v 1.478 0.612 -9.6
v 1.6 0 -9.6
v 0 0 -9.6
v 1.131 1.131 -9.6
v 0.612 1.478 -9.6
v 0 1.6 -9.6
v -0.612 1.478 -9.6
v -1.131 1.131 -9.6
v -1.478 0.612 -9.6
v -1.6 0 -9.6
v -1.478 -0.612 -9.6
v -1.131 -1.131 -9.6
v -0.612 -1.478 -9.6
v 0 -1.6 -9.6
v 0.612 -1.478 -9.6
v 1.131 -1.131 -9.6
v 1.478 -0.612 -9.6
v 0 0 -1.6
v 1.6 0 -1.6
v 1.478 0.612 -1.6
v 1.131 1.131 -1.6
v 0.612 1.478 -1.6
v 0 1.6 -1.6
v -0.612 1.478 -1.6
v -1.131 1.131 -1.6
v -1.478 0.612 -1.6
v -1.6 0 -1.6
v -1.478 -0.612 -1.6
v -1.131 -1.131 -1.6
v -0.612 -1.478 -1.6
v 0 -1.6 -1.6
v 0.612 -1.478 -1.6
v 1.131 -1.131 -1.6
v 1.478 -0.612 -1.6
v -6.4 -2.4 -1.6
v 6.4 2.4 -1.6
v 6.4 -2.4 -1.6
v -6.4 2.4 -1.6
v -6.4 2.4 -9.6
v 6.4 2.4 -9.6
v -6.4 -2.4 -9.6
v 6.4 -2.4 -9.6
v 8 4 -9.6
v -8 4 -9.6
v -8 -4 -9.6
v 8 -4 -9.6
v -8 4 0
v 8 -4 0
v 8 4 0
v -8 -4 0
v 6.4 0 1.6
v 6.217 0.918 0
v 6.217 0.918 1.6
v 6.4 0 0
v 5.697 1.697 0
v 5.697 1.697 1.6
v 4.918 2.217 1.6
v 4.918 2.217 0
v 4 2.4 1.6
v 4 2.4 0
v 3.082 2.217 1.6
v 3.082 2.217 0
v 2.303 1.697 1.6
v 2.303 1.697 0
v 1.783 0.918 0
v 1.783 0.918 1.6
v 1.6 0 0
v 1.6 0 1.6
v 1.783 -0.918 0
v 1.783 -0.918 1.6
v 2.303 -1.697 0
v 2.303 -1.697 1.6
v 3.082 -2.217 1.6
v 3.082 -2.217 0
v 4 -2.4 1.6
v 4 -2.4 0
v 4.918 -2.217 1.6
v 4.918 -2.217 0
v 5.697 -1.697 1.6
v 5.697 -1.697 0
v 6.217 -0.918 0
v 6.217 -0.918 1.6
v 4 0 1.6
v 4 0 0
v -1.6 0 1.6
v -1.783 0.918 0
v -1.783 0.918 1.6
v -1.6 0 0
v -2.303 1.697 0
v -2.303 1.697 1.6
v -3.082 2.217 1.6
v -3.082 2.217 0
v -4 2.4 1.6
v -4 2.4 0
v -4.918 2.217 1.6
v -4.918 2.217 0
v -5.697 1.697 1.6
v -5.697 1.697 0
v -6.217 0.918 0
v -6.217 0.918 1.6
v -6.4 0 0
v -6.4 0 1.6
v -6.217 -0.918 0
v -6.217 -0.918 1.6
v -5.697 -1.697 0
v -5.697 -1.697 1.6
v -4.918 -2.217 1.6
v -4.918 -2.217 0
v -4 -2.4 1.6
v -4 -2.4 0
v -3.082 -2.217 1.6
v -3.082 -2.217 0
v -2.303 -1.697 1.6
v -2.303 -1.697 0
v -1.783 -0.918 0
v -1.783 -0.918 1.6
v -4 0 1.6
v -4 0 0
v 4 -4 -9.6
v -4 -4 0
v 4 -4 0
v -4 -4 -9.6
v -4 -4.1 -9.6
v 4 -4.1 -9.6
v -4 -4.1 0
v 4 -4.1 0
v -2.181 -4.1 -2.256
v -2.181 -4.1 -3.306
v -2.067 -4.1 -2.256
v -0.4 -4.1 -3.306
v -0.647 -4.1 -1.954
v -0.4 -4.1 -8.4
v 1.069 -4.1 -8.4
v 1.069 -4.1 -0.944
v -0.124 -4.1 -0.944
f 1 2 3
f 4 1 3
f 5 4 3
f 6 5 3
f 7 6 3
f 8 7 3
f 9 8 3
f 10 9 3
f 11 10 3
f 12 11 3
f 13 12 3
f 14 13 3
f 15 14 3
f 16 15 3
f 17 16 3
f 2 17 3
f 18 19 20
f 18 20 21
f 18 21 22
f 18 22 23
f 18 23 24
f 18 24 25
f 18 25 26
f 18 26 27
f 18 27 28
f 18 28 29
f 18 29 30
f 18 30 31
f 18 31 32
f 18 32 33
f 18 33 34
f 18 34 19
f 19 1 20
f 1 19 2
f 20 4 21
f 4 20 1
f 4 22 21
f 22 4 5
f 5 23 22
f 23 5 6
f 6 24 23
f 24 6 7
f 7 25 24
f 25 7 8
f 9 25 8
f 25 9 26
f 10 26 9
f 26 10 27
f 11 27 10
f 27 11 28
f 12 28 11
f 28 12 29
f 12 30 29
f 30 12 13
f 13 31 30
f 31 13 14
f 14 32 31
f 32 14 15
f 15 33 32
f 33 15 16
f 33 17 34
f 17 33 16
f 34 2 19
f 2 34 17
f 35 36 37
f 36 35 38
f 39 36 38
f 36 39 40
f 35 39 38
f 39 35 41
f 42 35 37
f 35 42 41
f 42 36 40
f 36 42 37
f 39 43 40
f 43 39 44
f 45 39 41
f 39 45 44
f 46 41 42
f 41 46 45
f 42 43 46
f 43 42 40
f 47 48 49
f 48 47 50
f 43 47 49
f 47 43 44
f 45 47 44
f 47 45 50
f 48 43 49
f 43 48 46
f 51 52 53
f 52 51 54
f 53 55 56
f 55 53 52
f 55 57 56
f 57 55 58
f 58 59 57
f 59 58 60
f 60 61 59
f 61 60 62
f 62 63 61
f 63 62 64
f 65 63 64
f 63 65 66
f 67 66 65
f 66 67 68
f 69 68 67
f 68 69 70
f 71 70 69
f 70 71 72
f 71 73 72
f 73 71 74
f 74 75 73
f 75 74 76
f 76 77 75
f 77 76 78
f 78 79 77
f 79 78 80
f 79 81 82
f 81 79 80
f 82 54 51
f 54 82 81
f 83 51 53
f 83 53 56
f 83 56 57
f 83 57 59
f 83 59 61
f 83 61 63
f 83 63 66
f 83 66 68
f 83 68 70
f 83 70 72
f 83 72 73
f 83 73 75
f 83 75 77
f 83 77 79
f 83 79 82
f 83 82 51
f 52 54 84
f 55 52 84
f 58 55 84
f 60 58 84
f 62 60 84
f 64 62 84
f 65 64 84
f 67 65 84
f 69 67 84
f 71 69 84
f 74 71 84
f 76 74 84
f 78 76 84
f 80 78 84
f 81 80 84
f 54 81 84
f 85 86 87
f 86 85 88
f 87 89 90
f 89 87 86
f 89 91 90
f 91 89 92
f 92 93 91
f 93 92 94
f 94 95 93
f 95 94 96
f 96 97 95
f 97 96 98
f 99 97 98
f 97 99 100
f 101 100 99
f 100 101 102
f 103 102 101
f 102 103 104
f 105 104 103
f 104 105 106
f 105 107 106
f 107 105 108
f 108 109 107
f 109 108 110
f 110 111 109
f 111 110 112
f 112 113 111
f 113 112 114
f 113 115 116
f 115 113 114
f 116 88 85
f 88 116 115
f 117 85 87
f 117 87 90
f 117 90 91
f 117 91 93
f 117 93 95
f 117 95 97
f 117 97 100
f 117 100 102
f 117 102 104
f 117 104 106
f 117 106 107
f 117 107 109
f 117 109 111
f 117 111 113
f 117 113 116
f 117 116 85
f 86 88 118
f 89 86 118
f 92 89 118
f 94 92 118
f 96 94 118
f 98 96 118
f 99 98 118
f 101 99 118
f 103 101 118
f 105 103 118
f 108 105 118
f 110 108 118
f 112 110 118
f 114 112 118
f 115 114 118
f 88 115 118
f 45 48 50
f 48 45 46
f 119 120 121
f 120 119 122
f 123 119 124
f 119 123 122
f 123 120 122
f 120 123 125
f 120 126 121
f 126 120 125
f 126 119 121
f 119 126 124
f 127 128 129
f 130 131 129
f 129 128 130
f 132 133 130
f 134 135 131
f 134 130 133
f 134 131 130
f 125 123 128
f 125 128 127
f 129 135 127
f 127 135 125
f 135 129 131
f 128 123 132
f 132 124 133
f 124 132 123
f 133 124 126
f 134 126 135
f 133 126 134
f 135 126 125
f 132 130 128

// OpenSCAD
// file: ../p/4-4edge.scad
use <../lib.scad>
function ldraw_lib__4_4edge() = [
// 0 Circle 1.0
// 0 Name: 4-4edge.dat
// 0 Author: James Jessiman
// 0 !LDRAW_ORG Primitive UPDATE 2017-01
// 0 !LICENSE Licensed under CC BY 2.0 and CC BY 4.0 : see CAreadme.txt
// 
// 0 BFC CERTIFY CCW
  [0,"BFC","CERTIFY"],
  [0,"BFC","CCW"],
// 
// 0 !HISTORY 1998-12-15 [PTadmin] Official Update 1998-10
// 0 !HISTORY 2005-12-28 [PTadmin] Official Update 2005-01
// 0 !HISTORY 2007-06-24 [PTadmin] Header formatted for Contributor Agreement
// 0 !HISTORY 2008-07-01 [PTadmin] Official Update 2008-01
// 0 !HISTORY 2017-01-15 [Steffen] BFCed
// 0 !HISTORY 2017-12-30 [PTadmin] Official Update 2017-01
// 
// 
// 2 24 1 0 0 0.9239 0 0.3827
  [2,24,1,0,0,0.9239,0,0.3827],
// 2 24 0.9239 0 0.3827 0.7071 0 0.7071
  [2,24,0.9239,0,0.3827,0.7071,0,0.7071],
// 2 24 0.7071 0 0.7071 0.3827 0 0.9239
  [2,24,0.7071,0,0.7071,0.3827,0,0.9239],
// 2 24 0.3827 0 0.9239 0 0 1
  [2,24,0.3827,0,0.9239,0,0,1],
// 2 24 0 0 1 -0.3827 0 0.9239
  [2,24,0,0,1,-0.3827,0,0.9239],
// 2 24 -0.3827 0 0.9239 -0.7071 0 0.7071
  [2,24,-0.3827,0,0.9239,-0.7071,0,0.7071],
// 2 24 -0.7071 0 0.7071 -0.9239 0 0.3827
  [2,24,-0.7071,0,0.7071,-0.9239,0,0.3827],
// 2 24 -0.9239 0 0.3827 -1 0 -0
  [2,24,-0.9239,0,0.3827,-1,0,-0],
// 2 24 -1 0 -0 -0.9239 0 -0.3827
  [2,24,-1,0,-0,-0.9239,0,-0.3827],
// 2 24 -0.9239 0 -0.3827 -0.7071 0 -0.7071
  [2,24,-0.9239,0,-0.3827,-0.7071,0,-0.7071],
// 2 24 -0.7071 0 -0.7071 -0.3827 0 -0.9239
  [2,24,-0.7071,0,-0.7071,-0.3827,0,-0.9239],
// 2 24 -0.3827 0 -0.9239 0 0 -1
  [2,24,-0.3827,0,-0.9239,0,0,-1],
// 2 24 0 0 -1 0.3827 0 -0.9239
  [2,24,0,0,-1,0.3827,0,-0.9239],
// 2 24 0.3827 0 -0.9239 0.7071 0 -0.7071
  [2,24,0.3827,0,-0.9239,0.7071,0,-0.7071],
// 2 24 0.7071 0 -0.7071 0.9239 0 -0.3827
  [2,24,0.7071,0,-0.7071,0.9239,0,-0.3827],
// 2 24 0.9239 0 -0.3827 1 0 0
  [2,24,0.9239,0,-0.3827,1,0,0],
];
module ldraw_lib__4_4edge(step=0, col=false, unit=2/5, alt=false, line=0.2, solid=!$preview)
    makepoly(ldraw_lib__4_4edge(), step=step, col=col, unit=unit, alt=alt, line=line, solid=solid);
ldraw_lib__4_4edge(line=0.2);
// file: ../p/4-4disc.scad
use <../lib.scad>
function ldraw_lib__4_4disc() = [
// 0 Disc 1.0
// 0 Name: 4-4disc.dat
// 0 Author: James Jessiman
// 0 !LDRAW_ORG Primitive UPDATE 2002-02
// 0 !LICENSE Licensed under CC BY 2.0 and CC BY 4.0 : see CAreadme.txt
// 
// 0 BFC CERTIFY CCW
  [0,"BFC","CERTIFY"],
  [0,"BFC","CCW"],
// 
// 0 !HISTORY 1998-12-15 [PTadmin] Official Update 1998-10
// 0 !HISTORY 2002-03-23 [sbliss] Added BFC statement
// 0 !HISTORY 2002-04-25 [PTadmin] Official Update 2002-02
// 0 !HISTORY 2007-06-24 [PTadmin] Header formatted for Contributor Agreement
// 0 !HISTORY 2008-07-01 [PTadmin] Official Update 2008-01
// 
// 
// 3 16 0 0 0 1 0 0 0.9239 0 0.3827
  [3,16,0,0,0,1,0,0,0.9239,0,0.3827],
// 3 16 0 0 0 0.9239 0 0.3827 0.7071 0 0.7071
  [3,16,0,0,0,0.9239,0,0.3827,0.7071,0,0.7071],
// 3 16 0 0 0 0.7071 0 0.7071 0.3827 0 0.9239
  [3,16,0,0,0,0.7071,0,0.7071,0.3827,0,0.9239],
// 3 16 0 0 0 0.3827 0 0.9239 0 0 1
  [3,16,0,0,0,0.3827,0,0.9239,0,0,1],
// 3 16 0 0 0 0 0 1 -0.3827 0 0.9239
  [3,16,0,0,0,0,0,1,-0.3827,0,0.9239],
// 3 16 0 0 0 -0.3827 0 0.9239 -0.7071 0 0.7071
  [3,16,0,0,0,-0.3827,0,0.9239,-0.7071,0,0.7071],
// 3 16 0 0 0 -0.7071 0 0.7071 -0.9239 0 0.3827
  [3,16,0,0,0,-0.7071,0,0.7071,-0.9239,0,0.3827],
// 3 16 0 0 0 -0.9239 0 0.3827 -1 0 -0
  [3,16,0,0,0,-0.9239,0,0.3827,-1,0,-0],
// 3 16 0 0 0 -1 0 -0 -0.9239 0 -0.3827
  [3,16,0,0,0,-1,0,-0,-0.9239,0,-0.3827],
// 3 16 0 0 0 -0.9239 0 -0.3827 -0.7071 0 -0.7071
  [3,16,0,0,0,-0.9239,0,-0.3827,-0.7071,0,-0.7071],
// 3 16 0 0 0 -0.7071 0 -0.7071 -0.3827 0 -0.9239
  [3,16,0,0,0,-0.7071,0,-0.7071,-0.3827,0,-0.9239],
// 3 16 0 0 0 -0.3827 0 -0.9239 0 0 -1
  [3,16,0,0,0,-0.3827,0,-0.9239,0,0,-1],
// 3 16 0 0 0 0 0 -1 0.3827 0 -0.9239
  [3,16,0,0,0,0,0,-1,0.3827,0,-0.9239],
// 3 16 0 0 0 0.3827 0 -0.9239 0.7071 0 -0.7071
  [3,16,0,0,0,0.3827,0,-0.9239,0.7071,0,-0.7071],
// 3 16 0 0 0 0.7071 0 -0.7071 0.9239 0 -0.3827
  [3,16,0,0,0,0.7071,0,-0.7071,0.9239,0,-0.3827],
// 3 16 0 0 0 0.9239 0 -0.3827 1 0 0
  [3,16,0,0,0,0.9239,0,-0.3827,1,0,0],
// 0
];
module ldraw_lib__4_4disc(step=0, col=false, unit=2/5, alt=false, line=0.2, solid=!$preview)
    makepoly(ldraw_lib__4_4disc(), step=step, col=col, unit=unit, alt=alt, line=line, solid=solid);
ldraw_lib__4_4disc(line=0.2);
// file: ../p/4-4cyli.scad
use <../lib.scad>
$fa=1; $fs=0.2;
function ldraw_lib__4_4cyli(realsolid=false) = [
// 0 Cylinder 1.0
// 0 Name: 4-4cyli.dat
// 0 Author: James Jessiman
// 0 !LDRAW_ORG Primitive UPDATE 2005-01
// 0 !LICENSE Licensed under CC BY 2.0 and CC BY 4.0 : see CAreadme.txt
// 
// 0 BFC CERTIFY CCW
  [0,"BFC","CERTIFY"],
  [0,"BFC","CCW"],
// 
// 0 !HISTORY 1998-12-15 [PTadmin] Official Update 1998-10
// 0 !HISTORY 2002-03-23 [sbliss] Added BFC statement; merged headers from files in distributions LDraw 0.27 and Complete.
// 0 !HISTORY 2002-04-25 [PTadmin] Official Update 2002-02
// 0 !HISTORY 2004-12-14 [guyvivan] BFC CCW
// 0 !HISTORY 2005-12-28 [PTadmin] Official Update 2005-01
// 0 !HISTORY 2007-06-24 [PTadmin] Header formatted for Contributor Agreement
// 0 !HISTORY 2008-07-01 [PTadmin] Official Update 2008-01
// 
// 
// 4 16 1 1 0 0.9239 1 0.3827 0.9239 0 0.3827 1 0 0
  [4,16,1,1,0,0.9239,1,0.3827,0.9239,0,0.3827,1,0,0],
// 5 24 1 0 0 1 1 0 0.9239 0 0.3827 0.9239 0 -0.3827
  [5,24,1,0,0,1,1,0,0.9239,0,0.3827,0.9239,0,-0.3827],
// 4 16 0.9239 1 0.3827 0.7071 1 0.7071 0.7071 0 0.7071 0.9239 0 0.3827
  [4,16,0.9239,1,0.3827,0.7071,1,0.7071,0.7071,0,0.7071,0.9239,0,0.3827],
// 5 24 0.9239 0 0.3827 0.9239 1 0.3827 0.7071 0 0.7071 1 0 0
  [5,24,0.9239,0,0.3827,0.9239,1,0.3827,0.7071,0,0.7071,1,0,0],
// 4 16 0.7071 1 0.7071 0.3827 1 0.9239 0.3827 0 0.9239 0.7071 0 0.7071
  [4,16,0.7071,1,0.7071,0.3827,1,0.9239,0.3827,0,0.9239,0.7071,0,0.7071],
// 5 24 0.7071 0 0.7071 0.7071 1 0.7071 0.3827 0 0.9239 0.9239 0 0.3827
  [5,24,0.7071,0,0.7071,0.7071,1,0.7071,0.3827,0,0.9239,0.9239,0,0.3827],
// 4 16 0.3827 1 0.9239 0 1 1 0 0 1 0.3827 0 0.9239
  [4,16,0.3827,1,0.9239,0,1,1,0,0,1,0.3827,0,0.9239],
// 5 24 0.3827 0 0.9239 0.3827 1 0.9239 0 0 1 0.7071 0 0.7071
  [5,24,0.3827,0,0.9239,0.3827,1,0.9239,0,0,1,0.7071,0,0.7071],
// 4 16 0 1 1 -0.3827 1 0.9239 -0.3827 0 0.9239 0 0 1
  [4,16,0,1,1,-0.3827,1,0.9239,-0.3827,0,0.9239,0,0,1],
// 5 24 0 0 1 0 1 1 -0.3827 0 0.9239 0.3827 0 0.9239
  [5,24,0,0,1,0,1,1,-0.3827,0,0.9239,0.3827,0,0.9239],
// 4 16 -0.3827 1 0.9239 -0.7071 1 0.7071 -0.7071 0 0.7071 -0.3827 0 0.9239
  [4,16,-0.3827,1,0.9239,-0.7071,1,0.7071,-0.7071,0,0.7071,-0.3827,0,0.9239],
// 5 24 -0.3827 0 0.9239 -0.3827 1 0.9239 -0.7071 0 0.7071 0 0 1
  [5,24,-0.3827,0,0.9239,-0.3827,1,0.9239,-0.7071,0,0.7071,0,0,1],
// 4 16 -0.7071 1 0.7071 -0.9239 1 0.3827 -0.9239 0 0.3827 -0.7071 0 0.7071
  [4,16,-0.7071,1,0.7071,-0.9239,1,0.3827,-0.9239,0,0.3827,-0.7071,0,0.7071],
// 5 24 -0.7071 0 0.7071 -0.7071 1 0.7071 -0.9239 0 0.3827 -0.3827 0 0.9239
  [5,24,-0.7071,0,0.7071,-0.7071,1,0.7071,-0.9239,0,0.3827,-0.3827,0,0.9239],
// 4 16 -0.9239 1 0.3827 -1 1 0 -1 0 0 -0.9239 0 0.3827
  [4,16,-0.9239,1,0.3827,-1,1,0,-1,0,0,-0.9239,0,0.3827],
// 5 24 -0.9239 0 0.3827 -0.9239 1 0.3827 -1 0 0 -0.7071 0 0.7071
  [5,24,-0.9239,0,0.3827,-0.9239,1,0.3827,-1,0,0,-0.7071,0,0.7071],
// 4 16 -1 1 0 -0.9239 1 -0.3827 -0.9239 0 -0.3827 -1 0 0
  [4,16,-1,1,0,-0.9239,1,-0.3827,-0.9239,0,-0.3827,-1,0,0],
// 5 24 -1 0 0 -1 1 0 -0.9239 0 -0.3827 -0.9239 0 0.3827
  [5,24,-1,0,0,-1,1,0,-0.9239,0,-0.3827,-0.9239,0,0.3827],
// 4 16 -0.9239 1 -0.3827 -0.7071 1 -0.7071 -0.7071 0 -0.7071 -0.9239 0 -0.3827
  [4,16,-0.9239,1,-0.3827,-0.7071,1,-0.7071,-0.7071,0,-0.7071,-0.9239,0,-0.3827],
// 5 24 -0.9239 0 -0.3827 -0.9239 1 -0.3827 -0.7071 0 -0.7071 -1 0 0
  [5,24,-0.9239,0,-0.3827,-0.9239,1,-0.3827,-0.7071,0,-0.7071,-1,0,0],
// 4 16 -0.7071 1 -0.7071 -0.3827 1 -0.9239 -0.3827 0 -0.9239 -0.7071 0 -0.7071
  [4,16,-0.7071,1,-0.7071,-0.3827,1,-0.9239,-0.3827,0,-0.9239,-0.7071,0,-0.7071],
// 5 24 -0.7071 0 -0.7071 -0.7071 1 -0.7071 -0.3827 0 -0.9239 -0.9239 0 -0.3827
  [5,24,-0.7071,0,-0.7071,-0.7071,1,-0.7071,-0.3827,0,-0.9239,-0.9239,0,-0.3827],
// 4 16 -0.3827 1 -0.9239 0 1 -1 0 0 -1 -0.3827 0 -0.9239
  [4,16,-0.3827,1,-0.9239,0,1,-1,0,0,-1,-0.3827,0,-0.9239],
// 5 24 -0.3827 0 -0.9239 -0.3827 1 -0.9239 0 0 -1 -0.7071 0 -0.7071
  [5,24,-0.3827,0,-0.9239,-0.3827,1,-0.9239,0,0,-1,-0.7071,0,-0.7071],
// 4 16 0 1 -1 0.3827 1 -0.9239 0.3827 0 -0.9239 0 0 -1
  [4,16,0,1,-1,0.3827,1,-0.9239,0.3827,0,-0.9239,0,0,-1],
// 5 24 0 0 -1 0 1 -1 0.3827 0 -0.9239 -0.3827 0 -0.9239
  [5,24,0,0,-1,0,1,-1,0.3827,0,-0.9239,-0.3827,0,-0.9239],
// 4 16 0.3827 1 -0.9239 0.7071 1 -0.7071 0.7071 0 -0.7071 0.3827 0 -0.9239
  [4,16,0.3827,1,-0.9239,0.7071,1,-0.7071,0.7071,0,-0.7071,0.3827,0,-0.9239],
// 5 24 0.3827 0 -0.9239 0.3827 1 -0.9239 0.7071 0 -0.7071 0 0 -1
  [5,24,0.3827,0,-0.9239,0.3827,1,-0.9239,0.7071,0,-0.7071,0,0,-1],
// 4 16 0.7071 1 -0.7071 0.9239 1 -0.3827 0.9239 0 -0.3827 0.7071 0 -0.7071
  [4,16,0.7071,1,-0.7071,0.9239,1,-0.3827,0.9239,0,-0.3827,0.7071,0,-0.7071],
// 5 24 0.7071 0 -0.7071 0.7071 1 -0.7071 0.9239 0 -0.3827 0.3827 0 -0.9239
  [5,24,0.7071,0,-0.7071,0.7071,1,-0.7071,0.9239,0,-0.3827,0.3827,0,-0.9239],
// 4 16 0.9239 1 -0.3827 1 1 0 1 0 0 0.9239 0 -0.3827
  [4,16,0.9239,1,-0.3827,1,1,0,1,0,0,0.9239,0,-0.3827],
// 5 24 0.9239 0 -0.3827 0.9239 1 -0.3827 1 0 0 0.7071 0 -0.7071
  [5,24,0.9239,0,-0.3827,0.9239,1,-0.3827,1,0,0,0.7071,0,-0.7071],
// 0
];
module ldraw_lib__4_4cyli(step=0, col=false, unit=2/5, alt=false, line=0.2, solid=!$preview)
    makepoly(ldraw_lib__4_4cyli(solid), step=step, col=col, unit=unit, alt=alt, line=line, solid=solid);
ldraw_lib__4_4cyli(line=0.2);
// file: ../p/stud3.scad
use <../lib.scad>
use <4-4cyli.scad>
use <4-4disc.scad>
use <4-4edge.scad>
function ldraw_lib__stud3() = [
// 0 Stud Tube Solid
// 0 Name: stud3.dat
// 0 Author: James Jessiman
// 0 !LDRAW_ORG Primitive UPDATE 2012-01
// 0 !LICENSE Licensed under CC BY 4.0 : see CAreadme.txt
// 
// 0 BFC CERTIFY CCW
  [0,"BFC","CERTIFY"],
  [0,"BFC","CCW"],
// 
// 0 !HISTORY 2002-04-04 [sbliss] Modified for BFC compliance
// 0 !HISTORY 2002-04-25 [PTadmin] Official Update 2002-02
// 0 !HISTORY 2007-06-24 [PTadmin] Header formatted for Contributor Agreement
// 0 !HISTORY 2008-07-01 [PTadmin] Official Update 2008-01
// 0 !HISTORY 2012-02-16 [Philo] Changed to CCW
// 0 !HISTORY 2012-03-30 [PTadmin] Official Update 2012-01
// 
// 
// 1 16 0 -4 0 4 0 0 0 1 0 0 0 4 4-4edge.dat
  [1,16,0,-4,0,4,0,0,0,1,0,0,0,4, ldraw_lib__4_4edge()],
// 1 16 0 0 0 4 0 0 0 1 0 0 0 4 4-4edge.dat
  [1,16,0,0,0,4,0,0,0,1,0,0,0,4, ldraw_lib__4_4edge()],
// 1 16 0 -4 0 4 0 0 0 1 0 0 0 4 4-4disc.dat
  [1,16,0,-4,0,4,0,0,0,1,0,0,0,4, ldraw_lib__4_4disc()],
  [-1,16,0,0,0,4,0,0,0,-1,0,0,0,4, ldraw_lib__4_4disc()],
// 1 16 0 -4 0 4 0 0 0 4 0 0 0 4 4-4cyli.dat
  [1,16,0,-4,0,4,0,0,0,4,0,0,0,4, ldraw_lib__4_4cyli()],
];
module ldraw_lib__stud3(step=0, col=false, unit=2/5, alt=false, line=0.2, solid=!$preview)
    makepoly(ldraw_lib__stud3(), step=step, col=col, unit=unit, alt=alt, line=line, solid=solid);
ldraw_lib__stud3(line=0.2);
// file: ../p/stud.scad
use <../lib.scad>
use <4-4cyli.scad>
use <4-4disc.scad>
use <4-4edge.scad>
function ldraw_lib__stud() = [
// 0 Stud
// 0 Name: stud.dat
// 0 Author: James Jessiman
// 0 !LDRAW_ORG Primitive UPDATE 2012-01
// 0 !LICENSE Licensed under CC BY 4.0 : see CAreadme.txt
// 
// 0 BFC CERTIFY CCW
  [0,"BFC","CERTIFY"],
  [0,"BFC","CCW"],
// 
// 0 !HISTORY 2002-04-04 [sbliss] Modified for BFC compliance
// 0 !HISTORY 2002-04-25 [PTadmin] Official Update 2002-02
// 0 !HISTORY 2007-06-24 [PTadmin] Header formatted for Contributor Agreement
// 0 !HISTORY 2008-07-01 [PTadmin] Official Update 2008-01
// 0 !HISTORY 2012-02-16 [Philo] Changed to CCW
// 0 !HISTORY 2012-03-30 [PTadmin] Official Update 2012-01
// 
// 
// 1 16 0 0 0 6 0 0 0 1 0 0 0 6 4-4edge.dat
  [1,16,0,0,0,6,0,0,0,1,0,0,0,6, ldraw_lib__4_4edge()],
// 1 16 0 -4 0 6 0 0 0 1 0 0 0 6 4-4edge.dat
  [1,16,0,-4,0,6,0,0,0,1,0,0,0,6, ldraw_lib__4_4edge()],
// 1 16 0 0 0 6 0 0 0 -4 0 0 0 6 4-4cyli.dat
  [1,16,0,0,0,6,0,0,0,-4,0,0,0,6, ldraw_lib__4_4cyli()],
// 1 16 0 -4 0 6 0 0 0 1 0 0 0 6 4-4disc.dat
  [1,16,0,-4,0,6,0,0,0,1,0,0,0,6, ldraw_lib__4_4disc()],
  [-1,16,0,0,0,6,0,0,0,-1,0,0,0,6, ldraw_lib__4_4disc()],
];
module ldraw_lib__stud(step=0, col=false, unit=2/5, alt=false, line=0.2, solid=!$preview)
    makepoly(ldraw_lib__stud(), step=step, col=col, unit=unit, alt=alt, line=line, solid=solid);
ldraw_lib__stud(line=0.2);
// file: ../p/box5.scad
use <../lib.scad>
function ldraw_lib__box5() = [
// 0 Box with 5 Faces and All Edges
// 0 Name: box5.dat
// 0 Author: James Jessiman
// 0 !LDRAW_ORG Primitive UPDATE 2012-01
// 0 !LICENSE Licensed under CC BY 2.0 and CC BY 4.0 : see CAreadme.txt
// 
// 0 BFC CERTIFY CCW
  [0,"BFC","CERTIFY"],
  [0,"BFC","CCW"],
// 
// 0 !HISTORY 2002-04-03 [sbliss] Modified for BFC compliance
// 0 !HISTORY 2002-04-25 [PTadmin] Official Update 2002-02
// 0 !HISTORY 2007-06-24 [PTadmin] Header formatted for Contributor Agreement
// 0 !HISTORY 2008-07-01 [PTadmin] Official Update 2008-01
// 0 !HISTORY 2012-02-16 [Philo] Changed to CCW
// 0 !HISTORY 2012-03-30 [PTadmin] Official Update 2012-01
// 
// 
// 2 24 1 1 1 -1 1 1
  [2,24,1,1,1,-1,1,1],
// 2 24 -1 1 1 -1 1 -1
  [2,24,-1,1,1,-1,1,-1],
// 2 24 -1 1 -1 1 1 -1
  [2,24,-1,1,-1,1,1,-1],
// 2 24 1 1 -1 1 1 1
  [2,24,1,1,-1,1,1,1],
// 2 24 1 0 1 -1 0 1
  [2,24,1,0,1,-1,0,1],
// 2 24 -1 0 1 -1 0 -1
  [2,24,-1,0,1,-1,0,-1],
// 2 24 -1 0 -1 1 0 -1
  [2,24,-1,0,-1,1,0,-1],
// 2 24 1 0 -1 1 0 1
  [2,24,1,0,-1,1,0,1],
// 2 24 1 0 1 1 1 1
  [2,24,1,0,1,1,1,1],
// 2 24 -1 0 1 -1 1 1
  [2,24,-1,0,1,-1,1,1],
// 2 24 1 0 -1 1 1 -1
  [2,24,1,0,-1,1,1,-1],
// 2 24 -1 0 -1 -1 1 -1
  [2,24,-1,0,-1,-1,1,-1],
// 4 16 -1 1 1 1 1 1 1 1 -1 -1 1 -1
  [4,16,-1,1,1,1,1,1,1,1,-1,-1,1,-1],
// 4 16 -1 1 1 -1 0 1 1 0 1 1 1 1
  [4,16,-1,1,1,-1,0,1,1,0,1,1,1,1],
// 4 16 -1 1 -1 -1 0 -1 -1 0 1 -1 1 1
  [4,16,-1,1,-1,-1,0,-1,-1,0,1,-1,1,1],
// 4 16 1 1 -1 1 0 -1 -1 0 -1 -1 1 -1
  [4,16,1,1,-1,1,0,-1,-1,0,-1,-1,1,-1],
// 4 16 1 1 1 1 0 1 1 0 -1 1 1 -1
  [4,16,1,1,1,1,0,1,1,0,-1,1,1,-1],
];
makepoly(ldraw_lib__box5(), line=0.2);
// file: ../p/box4t.scad
use <../lib.scad>
function ldraw_lib__box4t() = [
// 0 Box with 4 Adjacent Faces and All Edges
// 0 Name: box4t.dat
// 0 Author: Tore Eriksson [Tore_Eriksson]
// 0 !LDRAW_ORG Primitive UPDATE 2003-02
// 0 !LICENSE Licensed under CC BY 2.0 and CC BY 4.0 : see CAreadme.txt
// 
// 0 BFC CERTIFY CCW
  [0,"BFC","CERTIFY"],
  [0,"BFC","CCW"],
// 
// 0 !HISTORY 1997-09-29 [PTadmin] Official Update 1997-15
// 0 !HISTORY 2002-08-31 [izanette] Modified with WINDZ for BFC compliance
// 0 !HISTORY 2003-08-01 [PTadmin] Official Update 2003-02
// 0 !HISTORY 2007-06-24 [PTadmin] Header formatted for Contributor Agreement
// 0 !HISTORY 2008-07-01 [PTadmin] Official Update 2008-01
// 
// 
// 2 24 1 1 1 -1 1 1
  [2,24,1,1,1,-1,1,1],
// 2 24 -1 1 1 -1 1 -1
  [2,24,-1,1,1,-1,1,-1],
// 2 24 -1 1 -1 1 1 -1
  [2,24,-1,1,-1,1,1,-1],
// 2 24 1 1 -1 1 1 1
  [2,24,1,1,-1,1,1,1],
// 2 24 1 0 1 -1 0 1
  [2,24,1,0,1,-1,0,1],
// 2 24 -1 0 1 -1 0 -1
  [2,24,-1,0,1,-1,0,-1],
// 2 24 -1 0 -1 1 0 -1
  [2,24,-1,0,-1,1,0,-1],
// 2 24 1 0 -1 1 0 1
  [2,24,1,0,-1,1,0,1],
// 2 24 1 0 1 1 1 1
  [2,24,1,0,1,1,1,1],
// 2 24 -1 0 1 -1 1 1
  [2,24,-1,0,1,-1,1,1],
// 2 24 1 0 -1 1 1 -1
  [2,24,1,0,-1,1,1,-1],
// 2 24 -1 0 -1 -1 1 -1
  [2,24,-1,0,-1,-1,1,-1],
// 4 16 1 1 1 1 1 -1 -1 1 -1 -1 1 1
  [4,16,1,1,1,1,1,-1,-1,1,-1,-1,1,1],
// 4 16 1 1 1 -1 1 1 -1 0 1 1 0 1
  [4,16,1,1,1,-1,1,1,-1,0,1,1,0,1],
// 4 16 -1 1 1 -1 1 -1 -1 0 -1 -1 0 1
  [4,16,-1,1,1,-1,1,-1,-1,0,-1,-1,0,1],
// 0 4 16 -1 1 -1 -1 0 -1 1 0 -1 1 1 -1
// 4 16 1 1 -1 1 1 1 1 0 1 1 0 -1
  [4,16,1,1,-1,1,1,1,1,0,1,1,0,-1],
// 0
];
makepoly(ldraw_lib__box4t(), line=0.2);
// file: ../p/box5-12.scad
use <../lib.scad>
function ldraw_lib__box5_12() = [
// 0 Box with 5 Faces without Any Edges
// 0 Name: box5-12.dat
// 0 Author: Chris Dee [cwdee]
// 0 !LDRAW_ORG Primitive UPDATE 2009-02
// 0 !LICENSE Licensed under CC BY 2.0 and CC BY 4.0 : see CAreadme.txt
// 
// 0 BFC CERTIFY CCW
  [0,"BFC","CERTIFY"],
  [0,"BFC","CCW"],
// 
// 0 !HISTORY 2009-09-03 [PTadmin] Official Update 2009-02
// 
// 
// 4 16 1 1 1 1 1 -1 -1 1 -1 -1 1 1
  [4,16,1,1,1,1,1,-1,-1,1,-1,-1,1,1],
// 4 16 -1 0 1 1 0 1 1 1 1 -1 1 1
  [4,16,-1,0,1,1,0,1,1,1,1,-1,1,1],
// 4 16 -1 0 -1 -1 0 1 -1 1 1 -1 1 -1
  [4,16,-1,0,-1,-1,0,1,-1,1,1,-1,1,-1],
// 4 16 1 0 -1 -1 0 -1 -1 1 -1 1 1 -1
  [4,16,1,0,-1,-1,0,-1,-1,1,-1,1,1,-1],
// 4 16 1 0 1 1 0 -1 1 1 -1 1 1 1
  [4,16,1,0,1,1,0,-1,1,1,-1,1,1,1],
// 0
];
module ldraw_lib__box5_12(step=0, col=false, unit=2/5, alt=false, line=0.2, solid=!$preview)
    makepoly(ldraw_lib__box5_12(), step=step, col=col, unit=unit, alt=alt, line=line, solid=solid);
ldraw_lib__box5_12(line=0.2);
// file: s/3004s01.scad
use <../../lib.scad>
use <../../p/box4t.scad>
use <../../p/box5.scad>
use <../../p/stud.scad>
use <../../p/stud3.scad>
$fa=1; $fs=0.2;
function ldraw_lib__s__3004s01(realsolid=false) = [
// 0 ~Brick  1 x  2 without Front Face
// 0 Name: s\3004s01.dat
// 0 Author: James Jessiman
// 0 !LDRAW_ORG Subpart UPDATE 2003-03
// 0 !LICENSE Licensed under CC BY 2.0 and CC BY 4.0 : see CAreadme.txt
// 
// 0 BFC CERTIFY CCW
  [0,"BFC","CERTIFY"],
  [0,"BFC","CCW"],
// 
// 0 !HISTORY 2003-09-07 [jriley] Subfiling, BFC
// 0 !HISTORY 2003-12-19 [PTadmin] Official Update 2003-03
// 0 !HISTORY 2007-08-29 [PTadmin] Header formatted for Contributor Agreement
// 0 !HISTORY 2008-07-01 [PTadmin] Official Update 2008-01
// 
// 
// 1 16 0 4 0 1 0 0 0 -5 0 0 0 1 stud3.dat
  [1,16,0,4,0,1,0,0,0,-5,0,0,0,1, ldraw_lib__stud3(realsolid)],
// 0 BFC INVERTNEXT
  [0,"BFC","INVERTNEXT"],
// 1 16 0 24 0 16 0 0 0 -20 0 0 0 6 box5.dat
  [1,16,0,24,0,16,0,0,0,-20,0,0,0,6, ldraw_lib__box5(realsolid)],
// 4 16 20 24 10 16 24 6 -16 24 6 -20 24 10
  [4,16,20,24,10,16,24,6,-16,24,6,-20,24,10],
// 4 16 -20 24 10 -16 24 6 -16 24 -6 -20 24 -10
  [4,16,-20,24,10,-16,24,6,-16,24,-6,-20,24,-10],
// 4 16 -20 24 -10 -16 24 -6 16 24 -6 20 24 -10
  [4,16,-20,24,-10,-16,24,-6,16,24,-6,20,24,-10],
// 4 16 20 24 -10 16 24 -6 16 24 6 20 24 10
  [4,16,20,24,-10,16,24,-6,16,24,6,20,24,10],
// 1 16 0 24 0 20 0 0 0 -24 0 0 0 10 box4t.dat
  [1,16,0,24,0,20,0,0,0,-24,0,0,0,10, ldraw_lib__box4t(realsolid)],
// 1 16 10 0 0 1 0 0 0 1 0 0 0 1 stud.dat
  [1,16,10,0,0,1,0,0,0,1,0,0,0,1, ldraw_lib__stud(realsolid)],
// 1 16 -10 0 0 1 0 0 0 1 0 0 0 1 stud.dat
  [1,16,-10,0,0,1,0,0,0,1,0,0,0,1, ldraw_lib__stud(realsolid)],
// 0
];
module ldraw_lib__s__3004s01(step=0, col=false, unit=2/5, alt=false, line=0.2, solid=!$preview)
    makepoly(ldraw_lib__s__3004s01(solid), step=step, col=col, unit=unit, alt=alt, line=line, solid=solid);
ldraw_lib__s__3004s01(line=0.2);
// file: 191888c.scad
use <../lib.scad>
use <../p/box5-12.scad>
function ldraw_lib__191888c() = [
// 0 Sticker  1.2 x  1 with White "1"
// 0 Name: 191888c.dat
// 0 Author: Steffen [Steffen]
// 0 !LDRAW_ORG Part UPDATE 2012-01
// 0 !LICENSE Licensed under CC BY 4.0 : see CAreadme.txt
// 
// 0 BFC CERTIFY CCW
  [0,"BFC","CERTIFY"],
  [0,"BFC","CCW"],
// 
// 0 !KEYWORDS set 7710
// 
// 0 !HISTORY 2012-03-30 [PTadmin] Official Update 2012-01
// 
// 
// 1 16 0 -0.25 0 10 0 0 0 0.25 0 0 0 -12 box5-12.dat
  [1,16,0,-0.25,0,10,0,0,0,0.25,0,0,0,-12, ldraw_lib__box5_12()],
// 3 15 -5.453 -0.25 6.359 -5.453 -0.25 3.734 -5.167 -0.25 6.359
  [3,15,-5.453,-0.25,6.359,-5.453,-0.25,3.734,-5.167,-0.25,6.359],
// 3 15 -1 -0.25 3.734 -1.618 -0.25 7.115 -5.167 -0.25 6.359
  [3,15,-1,-0.25,3.734,-1.618,-0.25,7.115,-5.167,-0.25,6.359],
// 3 15 -5.167 -0.25 6.359 -5.453 -0.25 3.734 -1 -0.25 3.734
  [3,15,-5.167,-0.25,6.359,-5.453,-0.25,3.734,-1,-0.25,3.734],
// 3 15 -1 -0.25 -9 2.672 -0.25 -9 -1 -0.25 3.734
  [3,15,-1,-0.25,-9,2.672,-0.25,-9,-1,-0.25,3.734],
// 3 15 2.672 -0.25 9.641 -0.31 -0.25 9.641 -1.618 -0.25 7.115
  [3,15,2.672,-0.25,9.641,-0.31,-0.25,9.641,-1.618,-0.25,7.115],
// 3 15 2.672 -0.25 9.641 -1 -0.25 3.734 2.672 -0.25 -9
  [3,15,2.672,-0.25,9.641,-1,-0.25,3.734,2.672,-0.25,-9],
// 3 15 2.672 -0.25 9.641 -1.618 -0.25 7.115 -1 -0.25 3.734
  [3,15,2.672,-0.25,9.641,-1.618,-0.25,7.115,-1,-0.25,3.734],
// 3 16 -10 -0.25 12 -10 -0.25 -12 -5.453 -0.25 3.734
  [3,16,-10,-0.25,12,-10,-0.25,-12,-5.453,-0.25,3.734],
// 3 16 -10 -0.25 12 -5.453 -0.25 3.734 -5.453 -0.25 6.359
  [3,16,-10,-0.25,12,-5.453,-0.25,3.734,-5.453,-0.25,6.359],
// 3 16 -5.167 -0.25 6.359 -0.31 -0.25 9.641 -5.453 -0.25 6.359
  [3,16,-5.167,-0.25,6.359,-0.31,-0.25,9.641,-5.453,-0.25,6.359],
// 3 16 -5.453 -0.25 6.359 -0.31 -0.25 9.641 -10 -0.25 12
  [3,16,-5.453,-0.25,6.359,-0.31,-0.25,9.641,-10,-0.25,12],
// 3 16 -0.31 -0.25 9.641 -5.167 -0.25 6.359 -1.618 -0.25 7.115
  [3,16,-0.31,-0.25,9.641,-5.167,-0.25,6.359,-1.618,-0.25,7.115],
// 3 16 -5.453 -0.25 3.734 -10 -0.25 -12 -1 -0.25 -9
  [3,16,-5.453,-0.25,3.734,-10,-0.25,-12,-1,-0.25,-9],
// 3 16 -1 -0.25 -9 10 -0.25 -12 2.672 -0.25 -9
  [3,16,-1,-0.25,-9,10,-0.25,-12,2.672,-0.25,-9],
// 3 16 10 -0.25 -12 -1 -0.25 -9 -10 -0.25 -12
  [3,16,10,-0.25,-12,-1,-0.25,-9,-10,-0.25,-12],
// 3 16 2.672 -0.25 -9 10 -0.25 -12 10 -0.25 12
  [3,16,2.672,-0.25,-9,10,-0.25,-12,10,-0.25,12],
// 3 16 2.672 -0.25 9.641 10 -0.25 12 -0.31 -0.25 9.641
  [3,16,2.672,-0.25,9.641,10,-0.25,12,-0.31,-0.25,9.641],
// 3 16 2.672 -0.25 -9 10 -0.25 12 2.672 -0.25 9.641
  [3,16,2.672,-0.25,-9,10,-0.25,12,2.672,-0.25,9.641],
// 3 16 -0.31 -0.25 9.641 10 -0.25 12 -10 -0.25 12
  [3,16,-0.31,-0.25,9.641,10,-0.25,12,-10,-0.25,12],
// 3 16 -1 -0.25 -9 -1 -0.25 3.734 -5.453 -0.25 3.734
  [3,16,-1,-0.25,-9,-1,-0.25,3.734,-5.453,-0.25,3.734],
];
module ldraw_lib__191888c(step=0, col=false, unit=2/5, alt=false, line=0.2, solid=!$preview)
    makepoly(ldraw_lib__191888c(), step=step, col=col, unit=unit, alt=alt, line=line, solid=solid);
ldraw_lib__191888c(line=0.2);
// file: 3004.scad
use <../lib.scad>
use <s/3004s01.scad>
function ldraw_lib__3004() = [
// 0 Brick  1 x  2
// 0 Name: 3004.dat
// 0 Author: James Jessiman
// 0 !LDRAW_ORG Part UPDATE 2022-05
// 0 !LICENSE Licensed under CC BY 2.0 and CC BY 4.0 : see CAreadme.txt
// 
// 0 BFC CERTIFY CCW
  [0,"BFC","CERTIFY"],
  [0,"BFC","CCW"],
// 
// 0 !HISTORY 2001-10-26 [PTadmin] Official Update 2001-01
// 0 !HISTORY 2002-05-07 {unknown} BFC Certification
// 0 !HISTORY 2002-06-11 [PTadmin] Official Update 2002-03
// 0 !HISTORY 2007-05-07 [PTadmin] Header formatted for Contributor Agreement
// 0 !HISTORY 2008-07-01 [PTadmin] Official Update 2008-01
// 0 !HISTORY 2022-08-04 [MagFors] Using subfile
// 0 !HISTORY 2022-09-15 [PTadmin] Official Update 2022-05
// 
// 
// 1 16 0 0 0 1 0 0 0 1 0 0 0 1 s\3004s01.dat
  [1,16,0,0,0,1,0,0,0,1,0,0,0,1, ldraw_lib__s__3004s01()],
// 4 16 -20 24 -10 20 24 -10 20 0 -10 -20 0 -10
  [4,16,-20,24,-10,20,24,-10,20,0,-10,-20,0,-10],
];
module ldraw_lib__3004(step=0, col=false, unit=2/5, alt=false, line=0.2, solid=!$preview)
    makepoly(ldraw_lib__3004(), step=step, col=col, unit=unit, alt=alt, line=line, solid=solid);
ldraw_lib__3004(line=0.2);
// file: 196925c.scad
use <../lib.scad>
use <191888c.scad>
function ldraw_lib__196925c() = [
// 0 =Sticker  1.2 x  1 with White "1"
// 0 Name: 196925c.dat
// 0 Author: Takeshi Takahashi [RainbowDolphin]
// 0 !LDRAW_ORG Part Alias UPDATE 2025-03
// 0 !LICENSE Licensed under CC BY 4.0 : see CAreadme.txt
// 
// 0 BFC CERTIFY CCW
  [0,"BFC","CERTIFY"],
  [0,"BFC","CCW"],
// 
// 0 !KEYWORDS 12V Train, Bricklink 7715stk01, Brickowl 717614
// 0 !KEYWORDS Push-Along Passenger Steam Train, Rebrickable 196925, Set 7715
// 
// 0 !HISTORY 2025-03-30 [OrionP] Official Update 2025-03
// 
// 1 16 0 0 0 1 0 0 0 1 0 0 0 1 191888c.dat
  [1,16,0,0,0,1,0,0,0,1,0,0,0,1, ldraw_lib__191888c()],
];
module ldraw_lib__196925c(step=0, col=false, unit=2/5, alt=false, line=0.2, solid=!$preview)
    makepoly(ldraw_lib__196925c(), step=step, col=col, unit=unit, alt=alt, line=line, solid=solid);
ldraw_lib__196925c(line=0.2);
// main file
use <../lib.scad>
use <196925c.scad>
use <3004.scad>
function ldraw_lib__3004d0p() = [
// 0 Brick  1 x  2 with White "1" Sticker
// 0 Name: 3004d0p.dat
// 0 Author: Takeshi Takahashi [RainbowDolphin]
// 0 !LDRAW_ORG Shortcut UPDATE 2025-03
// 0 !LICENSE Licensed under CC BY 4.0 : see CAreadme.txt
// 
// 0 BFC CERTIFY CCW
  [0,"BFC","CERTIFY"],
  [0,"BFC","CCW"],
// 
// 0 !CATEGORY Sticker Shortcut
// 0 !KEYWORDS Bricklink 3004pb039, Set 7715, Train
// 
// 0 !HISTORY 2025-03-30 [OrionP] Official Update 2025-03
// 
// 1 16 0 0 0 1 0 0 0 1 0 0 0 1 3004.dat
  [1,16,0,0,0,1,0,0,0,1,0,0,0,1, ldraw_lib__3004()],
// 1 16 0 12 -10 1 0 0 0 0 -1 0 1 0 196925c.dat
  [1,16,0,12,-10,1,0,0,0,0,-1,0,1,0, ldraw_lib__196925c()],
];
module ldraw_lib__3004d0p(step=0, col=false, unit=2/5, alt=false, line=0.2, solid=!$preview)
    makepoly(ldraw_lib__3004d0p(), step=step, col=col, unit=unit, alt=alt, line=line, solid=solid);
ldraw_lib__3004d0p(line=0.2);
